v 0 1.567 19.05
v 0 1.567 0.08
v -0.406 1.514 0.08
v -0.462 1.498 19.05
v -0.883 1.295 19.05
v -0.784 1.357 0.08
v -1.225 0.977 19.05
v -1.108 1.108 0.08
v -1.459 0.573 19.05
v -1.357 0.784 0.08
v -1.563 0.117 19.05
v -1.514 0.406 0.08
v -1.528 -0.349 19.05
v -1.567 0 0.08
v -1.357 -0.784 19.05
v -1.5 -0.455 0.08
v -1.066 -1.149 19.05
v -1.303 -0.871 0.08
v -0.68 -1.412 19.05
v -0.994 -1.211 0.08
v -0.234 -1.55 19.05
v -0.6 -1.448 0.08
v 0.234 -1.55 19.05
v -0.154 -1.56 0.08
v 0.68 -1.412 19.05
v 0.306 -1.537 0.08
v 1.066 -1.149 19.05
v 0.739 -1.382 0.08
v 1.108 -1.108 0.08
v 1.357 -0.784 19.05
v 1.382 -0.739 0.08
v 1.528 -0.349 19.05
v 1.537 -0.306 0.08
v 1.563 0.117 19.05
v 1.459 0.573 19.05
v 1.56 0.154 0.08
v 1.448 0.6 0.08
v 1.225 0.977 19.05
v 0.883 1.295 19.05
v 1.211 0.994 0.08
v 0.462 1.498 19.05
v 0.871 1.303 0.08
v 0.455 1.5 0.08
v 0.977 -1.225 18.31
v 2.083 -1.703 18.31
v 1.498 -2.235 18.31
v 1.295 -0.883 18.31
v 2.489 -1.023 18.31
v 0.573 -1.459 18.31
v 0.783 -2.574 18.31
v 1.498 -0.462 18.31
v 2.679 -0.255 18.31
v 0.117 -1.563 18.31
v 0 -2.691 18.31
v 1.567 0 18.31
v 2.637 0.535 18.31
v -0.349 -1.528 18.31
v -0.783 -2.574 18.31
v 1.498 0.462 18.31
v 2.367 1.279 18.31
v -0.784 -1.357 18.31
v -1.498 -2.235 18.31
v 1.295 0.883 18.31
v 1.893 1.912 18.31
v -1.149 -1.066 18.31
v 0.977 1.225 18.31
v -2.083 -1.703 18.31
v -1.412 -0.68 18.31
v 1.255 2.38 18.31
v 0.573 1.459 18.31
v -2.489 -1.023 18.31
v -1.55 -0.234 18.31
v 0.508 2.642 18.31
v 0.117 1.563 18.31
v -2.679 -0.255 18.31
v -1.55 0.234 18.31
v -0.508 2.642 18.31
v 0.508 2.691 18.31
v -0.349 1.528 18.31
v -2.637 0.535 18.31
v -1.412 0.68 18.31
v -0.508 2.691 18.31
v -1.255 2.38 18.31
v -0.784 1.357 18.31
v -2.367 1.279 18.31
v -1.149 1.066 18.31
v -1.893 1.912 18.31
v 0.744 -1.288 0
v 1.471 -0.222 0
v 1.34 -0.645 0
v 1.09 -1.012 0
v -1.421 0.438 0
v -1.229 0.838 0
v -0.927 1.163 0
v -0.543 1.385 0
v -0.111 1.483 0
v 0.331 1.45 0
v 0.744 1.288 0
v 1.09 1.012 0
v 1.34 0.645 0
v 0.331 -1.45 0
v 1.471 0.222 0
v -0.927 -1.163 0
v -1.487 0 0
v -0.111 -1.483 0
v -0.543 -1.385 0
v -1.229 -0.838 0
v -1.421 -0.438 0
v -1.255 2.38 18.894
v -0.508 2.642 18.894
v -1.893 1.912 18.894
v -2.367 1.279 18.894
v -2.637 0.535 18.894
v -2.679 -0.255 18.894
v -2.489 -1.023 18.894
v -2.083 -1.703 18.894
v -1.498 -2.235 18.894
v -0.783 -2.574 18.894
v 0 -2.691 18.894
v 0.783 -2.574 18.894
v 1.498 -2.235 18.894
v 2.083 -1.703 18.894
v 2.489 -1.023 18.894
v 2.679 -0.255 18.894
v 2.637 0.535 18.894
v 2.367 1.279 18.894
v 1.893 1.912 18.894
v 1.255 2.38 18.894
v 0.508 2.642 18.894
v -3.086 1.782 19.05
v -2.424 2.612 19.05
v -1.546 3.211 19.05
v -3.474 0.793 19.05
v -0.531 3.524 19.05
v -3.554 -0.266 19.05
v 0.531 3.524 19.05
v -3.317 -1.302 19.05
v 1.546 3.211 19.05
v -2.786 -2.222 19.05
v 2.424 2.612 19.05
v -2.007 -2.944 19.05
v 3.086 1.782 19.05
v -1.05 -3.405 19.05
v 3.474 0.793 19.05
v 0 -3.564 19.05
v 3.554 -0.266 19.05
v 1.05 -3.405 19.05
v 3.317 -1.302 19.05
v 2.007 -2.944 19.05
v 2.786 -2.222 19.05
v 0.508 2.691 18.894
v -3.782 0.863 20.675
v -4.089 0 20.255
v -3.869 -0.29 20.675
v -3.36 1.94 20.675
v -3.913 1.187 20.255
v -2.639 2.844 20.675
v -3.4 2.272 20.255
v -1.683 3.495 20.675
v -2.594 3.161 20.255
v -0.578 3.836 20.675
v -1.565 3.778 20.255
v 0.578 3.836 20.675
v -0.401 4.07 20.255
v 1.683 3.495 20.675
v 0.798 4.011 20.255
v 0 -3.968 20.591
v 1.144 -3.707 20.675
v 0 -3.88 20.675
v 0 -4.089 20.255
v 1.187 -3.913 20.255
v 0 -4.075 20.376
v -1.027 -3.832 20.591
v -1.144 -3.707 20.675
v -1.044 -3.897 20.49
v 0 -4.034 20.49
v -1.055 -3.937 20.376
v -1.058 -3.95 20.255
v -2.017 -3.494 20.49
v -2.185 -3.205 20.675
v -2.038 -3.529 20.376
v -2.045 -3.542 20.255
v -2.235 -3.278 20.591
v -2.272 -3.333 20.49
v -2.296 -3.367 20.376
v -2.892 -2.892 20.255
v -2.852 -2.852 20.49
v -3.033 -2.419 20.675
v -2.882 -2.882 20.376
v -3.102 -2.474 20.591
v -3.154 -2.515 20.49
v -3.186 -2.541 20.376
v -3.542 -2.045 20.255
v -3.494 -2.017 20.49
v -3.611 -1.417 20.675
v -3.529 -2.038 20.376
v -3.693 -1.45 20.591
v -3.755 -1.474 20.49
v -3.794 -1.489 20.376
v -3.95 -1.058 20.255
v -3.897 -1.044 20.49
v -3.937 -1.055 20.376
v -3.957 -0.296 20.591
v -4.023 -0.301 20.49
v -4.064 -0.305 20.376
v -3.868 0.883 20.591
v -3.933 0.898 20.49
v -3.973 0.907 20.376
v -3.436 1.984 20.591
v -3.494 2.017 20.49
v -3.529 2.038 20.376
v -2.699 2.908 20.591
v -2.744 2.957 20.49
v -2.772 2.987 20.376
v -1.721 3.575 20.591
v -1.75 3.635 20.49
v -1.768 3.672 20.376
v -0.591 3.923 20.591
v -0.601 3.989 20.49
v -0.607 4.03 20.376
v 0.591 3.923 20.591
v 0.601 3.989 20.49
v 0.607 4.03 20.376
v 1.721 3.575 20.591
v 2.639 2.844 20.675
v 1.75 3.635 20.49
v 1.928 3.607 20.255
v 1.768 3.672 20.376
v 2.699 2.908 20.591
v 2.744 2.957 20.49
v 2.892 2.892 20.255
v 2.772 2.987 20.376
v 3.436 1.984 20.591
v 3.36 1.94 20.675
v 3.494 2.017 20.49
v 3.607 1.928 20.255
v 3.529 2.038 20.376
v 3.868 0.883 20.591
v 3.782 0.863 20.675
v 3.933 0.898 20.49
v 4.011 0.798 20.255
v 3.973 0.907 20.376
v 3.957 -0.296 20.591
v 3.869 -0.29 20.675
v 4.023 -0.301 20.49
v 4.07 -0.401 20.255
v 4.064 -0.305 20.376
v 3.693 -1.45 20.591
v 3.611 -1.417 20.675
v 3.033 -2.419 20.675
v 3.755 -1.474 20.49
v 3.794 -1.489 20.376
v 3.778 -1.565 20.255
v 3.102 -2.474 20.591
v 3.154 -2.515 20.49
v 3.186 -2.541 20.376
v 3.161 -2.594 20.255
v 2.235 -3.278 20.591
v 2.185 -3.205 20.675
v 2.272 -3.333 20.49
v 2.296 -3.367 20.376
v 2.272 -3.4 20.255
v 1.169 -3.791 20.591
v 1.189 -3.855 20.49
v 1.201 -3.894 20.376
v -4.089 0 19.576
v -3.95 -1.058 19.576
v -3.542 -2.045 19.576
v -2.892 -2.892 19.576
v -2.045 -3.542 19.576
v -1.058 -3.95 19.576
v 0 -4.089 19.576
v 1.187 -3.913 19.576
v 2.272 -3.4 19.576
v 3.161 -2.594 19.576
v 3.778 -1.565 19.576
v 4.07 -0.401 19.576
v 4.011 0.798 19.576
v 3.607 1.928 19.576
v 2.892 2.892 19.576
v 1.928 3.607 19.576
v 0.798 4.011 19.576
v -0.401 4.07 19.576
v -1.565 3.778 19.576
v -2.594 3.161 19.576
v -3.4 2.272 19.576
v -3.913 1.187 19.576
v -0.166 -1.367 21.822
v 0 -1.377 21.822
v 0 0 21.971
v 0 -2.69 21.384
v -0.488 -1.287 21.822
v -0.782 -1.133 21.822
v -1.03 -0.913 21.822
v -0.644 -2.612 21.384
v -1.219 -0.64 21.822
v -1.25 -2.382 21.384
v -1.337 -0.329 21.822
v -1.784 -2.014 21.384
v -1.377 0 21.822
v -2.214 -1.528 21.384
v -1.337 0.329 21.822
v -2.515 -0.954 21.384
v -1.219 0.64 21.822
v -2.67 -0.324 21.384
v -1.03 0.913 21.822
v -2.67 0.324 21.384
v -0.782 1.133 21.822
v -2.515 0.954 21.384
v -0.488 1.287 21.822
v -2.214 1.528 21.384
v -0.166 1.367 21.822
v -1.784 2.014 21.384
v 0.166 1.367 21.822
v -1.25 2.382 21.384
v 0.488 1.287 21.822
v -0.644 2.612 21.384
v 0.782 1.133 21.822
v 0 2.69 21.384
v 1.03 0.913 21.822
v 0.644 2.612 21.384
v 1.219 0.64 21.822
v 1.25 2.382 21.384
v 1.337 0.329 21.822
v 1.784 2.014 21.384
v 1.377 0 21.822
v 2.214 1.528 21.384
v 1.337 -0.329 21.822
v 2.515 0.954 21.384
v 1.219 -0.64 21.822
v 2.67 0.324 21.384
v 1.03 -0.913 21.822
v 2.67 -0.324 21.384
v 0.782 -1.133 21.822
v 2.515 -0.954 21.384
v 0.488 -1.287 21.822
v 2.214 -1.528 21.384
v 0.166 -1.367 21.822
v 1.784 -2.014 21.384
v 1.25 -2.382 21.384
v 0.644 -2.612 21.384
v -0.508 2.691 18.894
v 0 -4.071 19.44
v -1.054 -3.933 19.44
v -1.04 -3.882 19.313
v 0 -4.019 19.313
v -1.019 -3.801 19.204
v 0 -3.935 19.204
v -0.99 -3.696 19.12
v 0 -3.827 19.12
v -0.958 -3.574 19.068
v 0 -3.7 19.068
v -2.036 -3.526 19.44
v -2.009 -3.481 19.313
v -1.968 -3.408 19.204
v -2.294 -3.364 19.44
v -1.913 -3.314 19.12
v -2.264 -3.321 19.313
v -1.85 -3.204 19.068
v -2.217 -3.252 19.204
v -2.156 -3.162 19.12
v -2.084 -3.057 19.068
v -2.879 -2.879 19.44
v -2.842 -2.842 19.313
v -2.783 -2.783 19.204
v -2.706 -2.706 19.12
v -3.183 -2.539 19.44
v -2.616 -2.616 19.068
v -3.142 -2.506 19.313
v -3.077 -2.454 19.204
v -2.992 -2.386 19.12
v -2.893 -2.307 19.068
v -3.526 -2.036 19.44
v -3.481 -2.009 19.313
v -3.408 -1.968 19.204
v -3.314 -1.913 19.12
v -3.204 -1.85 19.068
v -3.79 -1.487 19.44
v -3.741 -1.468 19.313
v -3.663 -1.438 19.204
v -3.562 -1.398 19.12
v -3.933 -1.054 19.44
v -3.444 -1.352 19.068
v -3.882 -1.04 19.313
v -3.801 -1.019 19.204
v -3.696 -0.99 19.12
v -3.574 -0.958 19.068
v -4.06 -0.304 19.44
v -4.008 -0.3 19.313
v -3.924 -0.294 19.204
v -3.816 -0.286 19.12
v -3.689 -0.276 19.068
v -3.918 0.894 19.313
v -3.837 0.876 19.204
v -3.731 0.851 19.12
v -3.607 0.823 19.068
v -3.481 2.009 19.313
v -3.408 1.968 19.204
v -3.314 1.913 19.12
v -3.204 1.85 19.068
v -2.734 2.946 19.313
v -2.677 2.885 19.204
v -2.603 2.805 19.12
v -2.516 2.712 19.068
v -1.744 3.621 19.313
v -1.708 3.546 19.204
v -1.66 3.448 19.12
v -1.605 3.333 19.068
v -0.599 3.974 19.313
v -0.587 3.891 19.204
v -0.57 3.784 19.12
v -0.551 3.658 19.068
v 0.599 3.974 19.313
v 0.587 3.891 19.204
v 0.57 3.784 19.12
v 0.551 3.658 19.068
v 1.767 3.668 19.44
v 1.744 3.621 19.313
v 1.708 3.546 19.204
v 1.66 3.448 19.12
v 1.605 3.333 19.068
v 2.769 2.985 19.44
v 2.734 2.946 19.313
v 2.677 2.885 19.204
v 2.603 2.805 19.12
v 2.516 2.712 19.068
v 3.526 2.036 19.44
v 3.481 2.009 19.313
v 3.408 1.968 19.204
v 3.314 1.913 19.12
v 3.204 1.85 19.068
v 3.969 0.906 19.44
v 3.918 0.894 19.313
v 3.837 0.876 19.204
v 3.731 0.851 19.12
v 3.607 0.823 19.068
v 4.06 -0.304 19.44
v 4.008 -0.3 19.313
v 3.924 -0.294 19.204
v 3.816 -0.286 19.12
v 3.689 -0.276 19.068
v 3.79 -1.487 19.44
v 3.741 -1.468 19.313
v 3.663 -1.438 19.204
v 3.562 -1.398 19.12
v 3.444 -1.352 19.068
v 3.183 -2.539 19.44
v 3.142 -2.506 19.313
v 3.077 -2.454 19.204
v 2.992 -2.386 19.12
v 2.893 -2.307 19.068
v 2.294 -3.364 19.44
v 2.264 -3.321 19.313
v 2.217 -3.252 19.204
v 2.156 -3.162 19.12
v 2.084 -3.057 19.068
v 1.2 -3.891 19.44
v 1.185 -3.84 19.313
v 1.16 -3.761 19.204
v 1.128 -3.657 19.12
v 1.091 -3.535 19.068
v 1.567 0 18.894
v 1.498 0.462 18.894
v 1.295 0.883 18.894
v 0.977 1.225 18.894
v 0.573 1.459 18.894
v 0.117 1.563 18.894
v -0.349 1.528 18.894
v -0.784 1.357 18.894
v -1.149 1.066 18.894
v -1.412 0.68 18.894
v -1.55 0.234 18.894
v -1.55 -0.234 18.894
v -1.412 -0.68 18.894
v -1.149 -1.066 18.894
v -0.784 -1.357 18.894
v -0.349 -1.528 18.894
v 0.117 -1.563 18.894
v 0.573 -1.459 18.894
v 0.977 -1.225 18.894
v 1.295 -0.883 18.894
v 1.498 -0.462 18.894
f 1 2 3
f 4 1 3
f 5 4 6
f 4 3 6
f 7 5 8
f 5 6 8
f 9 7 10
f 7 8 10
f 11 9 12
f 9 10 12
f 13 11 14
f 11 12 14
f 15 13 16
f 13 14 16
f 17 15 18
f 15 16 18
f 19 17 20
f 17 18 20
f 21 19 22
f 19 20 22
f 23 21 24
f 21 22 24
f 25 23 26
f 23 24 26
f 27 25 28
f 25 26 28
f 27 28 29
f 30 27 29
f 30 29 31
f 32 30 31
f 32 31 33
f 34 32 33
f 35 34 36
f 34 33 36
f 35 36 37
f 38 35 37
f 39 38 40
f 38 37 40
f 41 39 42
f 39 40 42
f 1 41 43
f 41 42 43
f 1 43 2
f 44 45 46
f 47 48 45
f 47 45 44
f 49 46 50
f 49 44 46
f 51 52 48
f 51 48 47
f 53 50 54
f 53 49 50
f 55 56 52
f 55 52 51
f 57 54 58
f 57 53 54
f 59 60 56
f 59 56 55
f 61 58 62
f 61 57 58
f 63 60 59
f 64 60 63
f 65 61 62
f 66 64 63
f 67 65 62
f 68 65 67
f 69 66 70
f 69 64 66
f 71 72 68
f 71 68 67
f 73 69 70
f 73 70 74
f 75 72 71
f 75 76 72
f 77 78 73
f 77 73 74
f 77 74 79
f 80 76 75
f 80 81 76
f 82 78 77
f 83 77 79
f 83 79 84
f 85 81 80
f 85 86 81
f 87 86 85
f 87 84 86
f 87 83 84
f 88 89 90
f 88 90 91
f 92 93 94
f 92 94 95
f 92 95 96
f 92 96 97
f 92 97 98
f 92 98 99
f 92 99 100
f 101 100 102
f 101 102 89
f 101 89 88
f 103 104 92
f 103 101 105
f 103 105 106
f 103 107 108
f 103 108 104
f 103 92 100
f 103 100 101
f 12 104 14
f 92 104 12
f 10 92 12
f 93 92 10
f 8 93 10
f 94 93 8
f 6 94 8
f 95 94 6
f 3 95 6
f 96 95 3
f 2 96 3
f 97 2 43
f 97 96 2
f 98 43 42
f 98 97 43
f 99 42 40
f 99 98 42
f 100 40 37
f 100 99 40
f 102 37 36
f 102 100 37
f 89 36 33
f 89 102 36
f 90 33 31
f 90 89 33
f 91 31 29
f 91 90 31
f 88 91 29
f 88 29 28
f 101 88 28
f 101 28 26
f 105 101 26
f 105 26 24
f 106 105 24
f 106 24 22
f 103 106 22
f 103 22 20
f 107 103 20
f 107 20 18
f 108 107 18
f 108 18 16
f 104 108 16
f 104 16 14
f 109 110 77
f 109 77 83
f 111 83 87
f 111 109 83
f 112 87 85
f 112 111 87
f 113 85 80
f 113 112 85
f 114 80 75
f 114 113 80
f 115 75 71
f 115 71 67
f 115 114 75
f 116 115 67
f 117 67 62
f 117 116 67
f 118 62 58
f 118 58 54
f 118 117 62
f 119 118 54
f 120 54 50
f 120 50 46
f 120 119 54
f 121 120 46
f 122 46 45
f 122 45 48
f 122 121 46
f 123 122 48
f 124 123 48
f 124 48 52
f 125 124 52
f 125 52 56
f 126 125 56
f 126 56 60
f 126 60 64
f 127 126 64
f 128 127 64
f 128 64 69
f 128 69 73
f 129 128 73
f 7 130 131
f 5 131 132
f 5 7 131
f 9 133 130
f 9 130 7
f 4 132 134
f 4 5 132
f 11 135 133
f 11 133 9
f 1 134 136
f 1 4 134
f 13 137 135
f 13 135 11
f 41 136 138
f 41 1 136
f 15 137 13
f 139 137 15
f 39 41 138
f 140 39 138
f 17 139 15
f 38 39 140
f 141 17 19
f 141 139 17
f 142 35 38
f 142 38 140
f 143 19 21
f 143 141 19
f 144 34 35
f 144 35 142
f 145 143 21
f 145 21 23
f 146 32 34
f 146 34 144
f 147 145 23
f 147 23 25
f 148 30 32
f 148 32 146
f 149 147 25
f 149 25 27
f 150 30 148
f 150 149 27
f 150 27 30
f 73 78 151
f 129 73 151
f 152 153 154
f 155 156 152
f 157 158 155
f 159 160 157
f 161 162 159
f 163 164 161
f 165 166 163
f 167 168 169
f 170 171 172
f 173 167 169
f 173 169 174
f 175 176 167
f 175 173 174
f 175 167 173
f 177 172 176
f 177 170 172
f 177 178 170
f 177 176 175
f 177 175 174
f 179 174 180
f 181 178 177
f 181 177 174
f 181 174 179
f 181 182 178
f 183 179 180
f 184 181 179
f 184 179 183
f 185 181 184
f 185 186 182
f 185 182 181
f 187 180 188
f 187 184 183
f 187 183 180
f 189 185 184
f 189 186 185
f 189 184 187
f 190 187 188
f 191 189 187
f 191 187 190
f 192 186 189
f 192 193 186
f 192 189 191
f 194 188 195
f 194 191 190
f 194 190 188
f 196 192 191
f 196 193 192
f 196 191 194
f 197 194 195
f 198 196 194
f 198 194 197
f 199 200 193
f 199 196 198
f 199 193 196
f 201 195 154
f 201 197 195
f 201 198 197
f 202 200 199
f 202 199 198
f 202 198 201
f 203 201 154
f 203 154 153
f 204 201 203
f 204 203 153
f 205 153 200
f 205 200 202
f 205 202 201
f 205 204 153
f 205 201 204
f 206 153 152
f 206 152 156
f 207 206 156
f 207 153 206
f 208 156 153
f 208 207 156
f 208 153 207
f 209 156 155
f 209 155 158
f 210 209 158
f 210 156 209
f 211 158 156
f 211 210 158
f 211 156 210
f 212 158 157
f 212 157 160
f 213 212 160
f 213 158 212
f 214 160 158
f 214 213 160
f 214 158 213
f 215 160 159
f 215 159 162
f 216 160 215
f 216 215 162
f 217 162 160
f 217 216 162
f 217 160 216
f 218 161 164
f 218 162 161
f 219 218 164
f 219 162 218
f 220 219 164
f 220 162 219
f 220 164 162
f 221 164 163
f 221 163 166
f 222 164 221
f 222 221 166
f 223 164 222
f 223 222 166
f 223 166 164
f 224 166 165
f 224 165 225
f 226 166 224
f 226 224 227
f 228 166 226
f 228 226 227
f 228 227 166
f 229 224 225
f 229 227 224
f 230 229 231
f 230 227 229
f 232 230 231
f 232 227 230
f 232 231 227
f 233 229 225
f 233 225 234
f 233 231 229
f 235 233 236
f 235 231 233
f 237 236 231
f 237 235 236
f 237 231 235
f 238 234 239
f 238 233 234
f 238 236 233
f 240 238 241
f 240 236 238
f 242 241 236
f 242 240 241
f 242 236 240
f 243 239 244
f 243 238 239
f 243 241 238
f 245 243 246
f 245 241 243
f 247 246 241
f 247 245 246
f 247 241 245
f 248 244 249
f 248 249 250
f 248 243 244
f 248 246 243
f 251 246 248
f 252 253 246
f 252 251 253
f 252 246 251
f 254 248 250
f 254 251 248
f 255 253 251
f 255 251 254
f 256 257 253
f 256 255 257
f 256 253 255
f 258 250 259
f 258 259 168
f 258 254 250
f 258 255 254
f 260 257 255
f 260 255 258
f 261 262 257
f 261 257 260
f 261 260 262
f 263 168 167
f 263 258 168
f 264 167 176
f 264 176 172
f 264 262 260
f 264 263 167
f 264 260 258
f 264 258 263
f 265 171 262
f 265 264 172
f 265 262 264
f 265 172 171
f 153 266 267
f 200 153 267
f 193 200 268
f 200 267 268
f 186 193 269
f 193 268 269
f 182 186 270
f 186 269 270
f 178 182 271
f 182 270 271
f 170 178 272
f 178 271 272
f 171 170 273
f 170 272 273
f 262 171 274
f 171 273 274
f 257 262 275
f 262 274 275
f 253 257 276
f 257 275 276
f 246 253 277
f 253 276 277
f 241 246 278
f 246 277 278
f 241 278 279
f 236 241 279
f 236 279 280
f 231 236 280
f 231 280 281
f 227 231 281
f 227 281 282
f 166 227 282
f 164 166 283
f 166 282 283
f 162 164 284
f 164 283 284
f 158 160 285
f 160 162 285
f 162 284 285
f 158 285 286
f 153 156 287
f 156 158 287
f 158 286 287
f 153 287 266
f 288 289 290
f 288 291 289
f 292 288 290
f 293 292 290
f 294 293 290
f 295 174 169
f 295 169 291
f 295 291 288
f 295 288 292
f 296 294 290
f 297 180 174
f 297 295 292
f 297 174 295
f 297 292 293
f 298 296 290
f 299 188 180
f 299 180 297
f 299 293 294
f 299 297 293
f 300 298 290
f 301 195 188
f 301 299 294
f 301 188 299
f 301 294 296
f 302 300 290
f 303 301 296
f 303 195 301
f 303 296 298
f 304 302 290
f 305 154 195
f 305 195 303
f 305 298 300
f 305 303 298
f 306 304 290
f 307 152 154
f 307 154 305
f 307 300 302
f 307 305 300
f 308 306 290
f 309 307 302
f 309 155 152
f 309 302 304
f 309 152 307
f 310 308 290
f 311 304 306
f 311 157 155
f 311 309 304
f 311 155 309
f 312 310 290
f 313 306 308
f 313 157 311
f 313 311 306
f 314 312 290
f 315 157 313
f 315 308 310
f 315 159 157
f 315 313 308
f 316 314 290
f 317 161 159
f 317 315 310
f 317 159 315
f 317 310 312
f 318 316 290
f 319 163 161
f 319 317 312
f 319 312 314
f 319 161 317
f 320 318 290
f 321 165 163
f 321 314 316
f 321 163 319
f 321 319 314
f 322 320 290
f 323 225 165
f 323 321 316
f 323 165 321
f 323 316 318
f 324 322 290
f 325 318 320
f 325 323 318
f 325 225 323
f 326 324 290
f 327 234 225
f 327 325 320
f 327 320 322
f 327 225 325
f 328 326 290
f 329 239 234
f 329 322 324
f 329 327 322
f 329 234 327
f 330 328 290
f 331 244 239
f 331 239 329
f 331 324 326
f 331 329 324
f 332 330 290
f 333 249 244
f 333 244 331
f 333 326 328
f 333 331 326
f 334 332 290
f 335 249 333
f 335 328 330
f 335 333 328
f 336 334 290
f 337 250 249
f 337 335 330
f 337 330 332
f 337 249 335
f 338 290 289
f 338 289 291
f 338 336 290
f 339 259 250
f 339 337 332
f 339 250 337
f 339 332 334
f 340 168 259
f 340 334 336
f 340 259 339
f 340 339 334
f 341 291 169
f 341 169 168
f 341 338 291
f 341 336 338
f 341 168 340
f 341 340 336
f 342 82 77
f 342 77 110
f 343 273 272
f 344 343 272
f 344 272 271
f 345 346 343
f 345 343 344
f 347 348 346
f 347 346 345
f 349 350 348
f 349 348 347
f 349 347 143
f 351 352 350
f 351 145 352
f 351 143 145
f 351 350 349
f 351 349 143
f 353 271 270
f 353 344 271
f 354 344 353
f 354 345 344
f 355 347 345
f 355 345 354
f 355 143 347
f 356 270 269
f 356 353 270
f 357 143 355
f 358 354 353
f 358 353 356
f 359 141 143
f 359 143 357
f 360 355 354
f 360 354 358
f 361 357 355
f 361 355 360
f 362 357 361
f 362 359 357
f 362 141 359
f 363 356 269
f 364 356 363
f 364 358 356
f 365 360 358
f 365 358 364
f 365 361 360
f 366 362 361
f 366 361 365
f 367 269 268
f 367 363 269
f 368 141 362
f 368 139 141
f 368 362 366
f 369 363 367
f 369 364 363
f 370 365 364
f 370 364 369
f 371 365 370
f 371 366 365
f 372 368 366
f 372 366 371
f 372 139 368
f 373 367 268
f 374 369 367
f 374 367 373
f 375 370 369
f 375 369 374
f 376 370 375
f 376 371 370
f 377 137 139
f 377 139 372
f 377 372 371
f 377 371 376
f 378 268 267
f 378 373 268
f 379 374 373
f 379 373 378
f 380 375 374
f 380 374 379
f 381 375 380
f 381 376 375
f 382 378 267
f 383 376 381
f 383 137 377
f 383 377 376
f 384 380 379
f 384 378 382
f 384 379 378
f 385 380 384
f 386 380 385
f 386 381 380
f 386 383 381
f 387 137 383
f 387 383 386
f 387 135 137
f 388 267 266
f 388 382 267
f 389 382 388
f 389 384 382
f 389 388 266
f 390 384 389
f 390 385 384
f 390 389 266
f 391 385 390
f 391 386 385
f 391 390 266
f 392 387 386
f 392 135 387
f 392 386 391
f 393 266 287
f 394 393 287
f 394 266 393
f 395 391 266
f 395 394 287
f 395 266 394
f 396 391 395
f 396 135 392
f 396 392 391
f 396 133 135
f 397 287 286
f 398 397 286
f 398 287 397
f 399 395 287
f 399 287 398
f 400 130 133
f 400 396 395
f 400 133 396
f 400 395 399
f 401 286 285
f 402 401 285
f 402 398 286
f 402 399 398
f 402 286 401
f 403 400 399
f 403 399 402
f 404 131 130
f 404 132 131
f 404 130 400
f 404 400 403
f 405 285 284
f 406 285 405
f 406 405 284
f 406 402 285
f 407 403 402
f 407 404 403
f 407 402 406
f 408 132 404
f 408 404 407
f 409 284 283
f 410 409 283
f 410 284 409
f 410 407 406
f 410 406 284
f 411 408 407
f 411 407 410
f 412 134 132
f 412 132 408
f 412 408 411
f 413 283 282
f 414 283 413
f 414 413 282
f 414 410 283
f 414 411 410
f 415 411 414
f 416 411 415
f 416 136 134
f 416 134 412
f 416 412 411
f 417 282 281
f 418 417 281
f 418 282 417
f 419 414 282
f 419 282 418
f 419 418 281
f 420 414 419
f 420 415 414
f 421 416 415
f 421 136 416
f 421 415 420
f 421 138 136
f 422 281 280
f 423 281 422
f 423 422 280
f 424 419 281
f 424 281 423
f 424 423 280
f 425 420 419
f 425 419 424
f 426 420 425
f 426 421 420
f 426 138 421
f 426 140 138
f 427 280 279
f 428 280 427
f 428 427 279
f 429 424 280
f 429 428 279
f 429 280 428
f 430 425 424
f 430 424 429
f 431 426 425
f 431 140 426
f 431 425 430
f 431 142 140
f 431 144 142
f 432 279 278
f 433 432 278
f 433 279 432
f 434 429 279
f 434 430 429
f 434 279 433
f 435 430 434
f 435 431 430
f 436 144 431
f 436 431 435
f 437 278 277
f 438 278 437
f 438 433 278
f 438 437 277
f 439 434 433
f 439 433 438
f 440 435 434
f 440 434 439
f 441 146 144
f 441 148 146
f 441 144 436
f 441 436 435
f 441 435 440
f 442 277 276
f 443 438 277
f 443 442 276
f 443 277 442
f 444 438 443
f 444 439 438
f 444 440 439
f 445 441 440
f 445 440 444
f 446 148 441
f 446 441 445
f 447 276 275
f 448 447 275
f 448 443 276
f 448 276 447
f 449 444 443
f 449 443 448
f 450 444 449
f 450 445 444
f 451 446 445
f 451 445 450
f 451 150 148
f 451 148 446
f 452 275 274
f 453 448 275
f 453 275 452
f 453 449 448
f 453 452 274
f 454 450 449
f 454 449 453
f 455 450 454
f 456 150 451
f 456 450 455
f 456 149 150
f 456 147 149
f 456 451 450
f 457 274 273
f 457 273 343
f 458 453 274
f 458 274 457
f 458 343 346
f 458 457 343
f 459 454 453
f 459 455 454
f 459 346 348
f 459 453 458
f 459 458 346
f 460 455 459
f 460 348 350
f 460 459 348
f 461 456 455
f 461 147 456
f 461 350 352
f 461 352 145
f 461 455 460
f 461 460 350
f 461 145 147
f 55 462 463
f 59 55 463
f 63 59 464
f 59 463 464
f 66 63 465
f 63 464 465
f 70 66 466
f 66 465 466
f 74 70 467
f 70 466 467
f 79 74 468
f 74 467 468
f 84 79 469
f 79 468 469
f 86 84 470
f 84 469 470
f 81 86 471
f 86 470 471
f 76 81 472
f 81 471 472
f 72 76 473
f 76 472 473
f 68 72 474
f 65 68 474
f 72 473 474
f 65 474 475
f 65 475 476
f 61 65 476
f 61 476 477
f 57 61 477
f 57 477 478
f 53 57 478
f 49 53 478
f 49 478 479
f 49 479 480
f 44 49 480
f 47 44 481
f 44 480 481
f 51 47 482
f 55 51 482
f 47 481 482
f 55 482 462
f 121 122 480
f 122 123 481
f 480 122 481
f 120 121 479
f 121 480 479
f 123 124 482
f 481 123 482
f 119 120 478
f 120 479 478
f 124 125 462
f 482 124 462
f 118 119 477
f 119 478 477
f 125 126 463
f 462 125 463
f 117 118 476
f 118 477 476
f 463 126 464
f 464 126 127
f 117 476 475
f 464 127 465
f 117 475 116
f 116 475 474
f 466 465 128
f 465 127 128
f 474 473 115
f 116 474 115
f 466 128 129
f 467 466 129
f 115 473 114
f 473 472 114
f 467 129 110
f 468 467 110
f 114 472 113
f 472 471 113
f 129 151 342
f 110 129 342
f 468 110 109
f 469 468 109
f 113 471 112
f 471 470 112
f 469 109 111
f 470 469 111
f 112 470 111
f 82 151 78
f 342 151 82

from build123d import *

# Parameters (mm, degrees)
SKETCH3_W           = 19.05
SKETCH3_H           = 1.567244252
SKETCH38_OUTSIDE_W  = 49.402
SKETCH38_OUTSIDE_H  = 49.402
SKETCH38_OUTSIDE_R  = 1.4874875
EXTRUDE6_DEPTH      = 20.178503828
EXTRUDE6_DRAFT      = -45
SKETCH8_W           = 2.921
SKETCH8_H           = 4.0894
SKETCH21_R          = 2.690784338
SKETCH21_R_2        = 1.567244252
EXTRUDE2_DEPTH      = 0.5842
EXTRUDE3_REACH      = 25.354
EXTRUDE3_END_RADIUS = 2.690784338
SKETCH33_W          = 1.016
SKETCH33_H          = 0.5842


with BuildPart() as part:
    # Sketch3 → Revolve1 (revolve)
    with BuildSketch(Plane(origin=(0, 0, 0), x_dir=(0, 0, -1), z_dir=(1, 0, 0))):
        with Locations((-9.525, 0.783622126)):
            Rectangle(SKETCH3_W, SKETCH3_H)
    revolve(axis=Axis((0, 0, 0), (0, 0, 1)))


with BuildPart() as extrude6_tool:
    # Sketch38 outside → Extrude6 (with draft: the straight prism first)
    with BuildSketch(Plane(origin=(0, 0, 0), x_dir=(-1, 0, 0), z_dir=(0, 0, -1))):
        Rectangle(SKETCH38_OUTSIDE_W, SKETCH38_OUTSIDE_H)
        Circle(SKETCH38_OUTSIDE_R, mode=Mode.SUBTRACT)
    extrude(amount=-EXTRUDE6_DEPTH)
    # Extrude6: the draft: its side faces are tilted about the plane it starts from
    extrude6_sides = [extrude6_tool.faces().sort_by_distance(p)[0] for p in [
        (0, -24.701, 10.089251914),
        (-24.701, 0, 10.089251914),
        (0, 24.701, 10.089251914),
        (24.701, 0, 10.089251914),
        (1.4874875, 0, 10.089251914),
    ]]
    draft(extrude6_sides, Plane(origin=(0, 0, 0), x_dir=(-1, 0, 0), z_dir=(0, 0, -1)), EXTRUDE6_DRAFT)


with BuildPart() as part_1:
    add(part.part)

    # Extrude6: cut by extrude6_tool
    add(extrude6_tool.part, mode=Mode.SUBTRACT)

    # Sketch8 → Revolve2 (revolve)
    with BuildSketch(Plane(origin=(0, 0, 0), x_dir=(0, 0, -1), z_dir=(1, 0, 0)), mode=Mode.PRIVATE) as revolve2_sk:
        with Locations((-20.5105, 2.0447)):
            Rectangle(SKETCH8_W, SKETCH8_H)
    revolve(revolve2_sk.sketch.rotate(Axis((0, 0, 0), (0, 0, 1)), 90), axis=Axis((0, 0, 0), (0, 0, 1)))

    # Sketch11 → Cut-Revolve3 (revolve, cut)
    with BuildSketch(Plane(origin=(0, 0, 0), x_dir=(0, 0, -1), z_dir=(1, 0, 0)), mode=Mode.PRIVATE) as cut_revolve3_sk:
        with BuildLine():
            Line((-20.254906874, 4.0894), (-19.57578, 4.0894))
            ThreePointArc((-19.57578, 4.0894), (-19.203997397, 3.935402603), (-19.05, 3.56362))
            Line((-19.05, 3.56362), (-18.415, 3.56362))
            Line((-18.415, 3.56362), (-18.415, 4.7244))
            Line((-18.415, 4.7244), (-22.606, 4.7244))
            Line((-22.606, 4.7244), (-22.606, 0))
            Line((-22.606, 0), (-21.971, 0))
            ThreePointArc((-21.971, 0), (-21.638470898, 2.045152261), (-20.675141868, 3.87960601))
            ThreePointArc((-20.675141868, 3.87960601), (-20.489753083, 4.034036694), (-20.254906874, 4.0894))
        make_face()
    revolve(cut_revolve3_sk.sketch.rotate(Axis((0, 0, 21.971), (0, 0, -1)), 180), axis=Axis((0, 0, 21.971), (0, 0, -1)), mode=Mode.SUBTRACT)


with BuildPart() as body_2:
    # Sketch21 → Extrude2 (new body)
    with BuildSketch(Plane.XY.offset(18.893869553)):
        Circle(SKETCH21_R)
        Circle(SKETCH21_R_2, mode=Mode.SUBTRACT)
    extrude(amount=-EXTRUDE2_DEPTH)

    # Extrude3: up to this cylinder (the profile starts outside it)
    extrude3_end = Plane(origin=(0, 0, 18.60177), z_dir=(0, 0, 1)) * Cylinder(EXTRUDE3_END_RADIUS, 57.089568677, mode=Mode.PRIVATE)
    # Sketch33 → Extrude3 (add, up to the surface)
    with BuildSketch(Plane(origin=(0, 2.690784338, 0), x_dir=(-1, 0, 0), z_dir=(0, 1, 0)), mode=Mode.PRIVATE) as extrude3_sk1:
        with Locations((0, 18.601769553)):
            Rectangle(SKETCH33_W, SKETCH33_H)
    extrude3_tool1 = extrude(extrude3_sk1.sketch, amount=-EXTRUDE3_REACH, mode=Mode.PRIVATE) - extrude3_end
    add(extrude3_tool1.solids().sort_by_distance((0, 2.690784, 18.60177))[0])
    add(extrude3_tool1.solids().sort_by_distance((0, 2.690784, 18.60177))[1])


solid = Compound([part_1.part, body_2.part])
